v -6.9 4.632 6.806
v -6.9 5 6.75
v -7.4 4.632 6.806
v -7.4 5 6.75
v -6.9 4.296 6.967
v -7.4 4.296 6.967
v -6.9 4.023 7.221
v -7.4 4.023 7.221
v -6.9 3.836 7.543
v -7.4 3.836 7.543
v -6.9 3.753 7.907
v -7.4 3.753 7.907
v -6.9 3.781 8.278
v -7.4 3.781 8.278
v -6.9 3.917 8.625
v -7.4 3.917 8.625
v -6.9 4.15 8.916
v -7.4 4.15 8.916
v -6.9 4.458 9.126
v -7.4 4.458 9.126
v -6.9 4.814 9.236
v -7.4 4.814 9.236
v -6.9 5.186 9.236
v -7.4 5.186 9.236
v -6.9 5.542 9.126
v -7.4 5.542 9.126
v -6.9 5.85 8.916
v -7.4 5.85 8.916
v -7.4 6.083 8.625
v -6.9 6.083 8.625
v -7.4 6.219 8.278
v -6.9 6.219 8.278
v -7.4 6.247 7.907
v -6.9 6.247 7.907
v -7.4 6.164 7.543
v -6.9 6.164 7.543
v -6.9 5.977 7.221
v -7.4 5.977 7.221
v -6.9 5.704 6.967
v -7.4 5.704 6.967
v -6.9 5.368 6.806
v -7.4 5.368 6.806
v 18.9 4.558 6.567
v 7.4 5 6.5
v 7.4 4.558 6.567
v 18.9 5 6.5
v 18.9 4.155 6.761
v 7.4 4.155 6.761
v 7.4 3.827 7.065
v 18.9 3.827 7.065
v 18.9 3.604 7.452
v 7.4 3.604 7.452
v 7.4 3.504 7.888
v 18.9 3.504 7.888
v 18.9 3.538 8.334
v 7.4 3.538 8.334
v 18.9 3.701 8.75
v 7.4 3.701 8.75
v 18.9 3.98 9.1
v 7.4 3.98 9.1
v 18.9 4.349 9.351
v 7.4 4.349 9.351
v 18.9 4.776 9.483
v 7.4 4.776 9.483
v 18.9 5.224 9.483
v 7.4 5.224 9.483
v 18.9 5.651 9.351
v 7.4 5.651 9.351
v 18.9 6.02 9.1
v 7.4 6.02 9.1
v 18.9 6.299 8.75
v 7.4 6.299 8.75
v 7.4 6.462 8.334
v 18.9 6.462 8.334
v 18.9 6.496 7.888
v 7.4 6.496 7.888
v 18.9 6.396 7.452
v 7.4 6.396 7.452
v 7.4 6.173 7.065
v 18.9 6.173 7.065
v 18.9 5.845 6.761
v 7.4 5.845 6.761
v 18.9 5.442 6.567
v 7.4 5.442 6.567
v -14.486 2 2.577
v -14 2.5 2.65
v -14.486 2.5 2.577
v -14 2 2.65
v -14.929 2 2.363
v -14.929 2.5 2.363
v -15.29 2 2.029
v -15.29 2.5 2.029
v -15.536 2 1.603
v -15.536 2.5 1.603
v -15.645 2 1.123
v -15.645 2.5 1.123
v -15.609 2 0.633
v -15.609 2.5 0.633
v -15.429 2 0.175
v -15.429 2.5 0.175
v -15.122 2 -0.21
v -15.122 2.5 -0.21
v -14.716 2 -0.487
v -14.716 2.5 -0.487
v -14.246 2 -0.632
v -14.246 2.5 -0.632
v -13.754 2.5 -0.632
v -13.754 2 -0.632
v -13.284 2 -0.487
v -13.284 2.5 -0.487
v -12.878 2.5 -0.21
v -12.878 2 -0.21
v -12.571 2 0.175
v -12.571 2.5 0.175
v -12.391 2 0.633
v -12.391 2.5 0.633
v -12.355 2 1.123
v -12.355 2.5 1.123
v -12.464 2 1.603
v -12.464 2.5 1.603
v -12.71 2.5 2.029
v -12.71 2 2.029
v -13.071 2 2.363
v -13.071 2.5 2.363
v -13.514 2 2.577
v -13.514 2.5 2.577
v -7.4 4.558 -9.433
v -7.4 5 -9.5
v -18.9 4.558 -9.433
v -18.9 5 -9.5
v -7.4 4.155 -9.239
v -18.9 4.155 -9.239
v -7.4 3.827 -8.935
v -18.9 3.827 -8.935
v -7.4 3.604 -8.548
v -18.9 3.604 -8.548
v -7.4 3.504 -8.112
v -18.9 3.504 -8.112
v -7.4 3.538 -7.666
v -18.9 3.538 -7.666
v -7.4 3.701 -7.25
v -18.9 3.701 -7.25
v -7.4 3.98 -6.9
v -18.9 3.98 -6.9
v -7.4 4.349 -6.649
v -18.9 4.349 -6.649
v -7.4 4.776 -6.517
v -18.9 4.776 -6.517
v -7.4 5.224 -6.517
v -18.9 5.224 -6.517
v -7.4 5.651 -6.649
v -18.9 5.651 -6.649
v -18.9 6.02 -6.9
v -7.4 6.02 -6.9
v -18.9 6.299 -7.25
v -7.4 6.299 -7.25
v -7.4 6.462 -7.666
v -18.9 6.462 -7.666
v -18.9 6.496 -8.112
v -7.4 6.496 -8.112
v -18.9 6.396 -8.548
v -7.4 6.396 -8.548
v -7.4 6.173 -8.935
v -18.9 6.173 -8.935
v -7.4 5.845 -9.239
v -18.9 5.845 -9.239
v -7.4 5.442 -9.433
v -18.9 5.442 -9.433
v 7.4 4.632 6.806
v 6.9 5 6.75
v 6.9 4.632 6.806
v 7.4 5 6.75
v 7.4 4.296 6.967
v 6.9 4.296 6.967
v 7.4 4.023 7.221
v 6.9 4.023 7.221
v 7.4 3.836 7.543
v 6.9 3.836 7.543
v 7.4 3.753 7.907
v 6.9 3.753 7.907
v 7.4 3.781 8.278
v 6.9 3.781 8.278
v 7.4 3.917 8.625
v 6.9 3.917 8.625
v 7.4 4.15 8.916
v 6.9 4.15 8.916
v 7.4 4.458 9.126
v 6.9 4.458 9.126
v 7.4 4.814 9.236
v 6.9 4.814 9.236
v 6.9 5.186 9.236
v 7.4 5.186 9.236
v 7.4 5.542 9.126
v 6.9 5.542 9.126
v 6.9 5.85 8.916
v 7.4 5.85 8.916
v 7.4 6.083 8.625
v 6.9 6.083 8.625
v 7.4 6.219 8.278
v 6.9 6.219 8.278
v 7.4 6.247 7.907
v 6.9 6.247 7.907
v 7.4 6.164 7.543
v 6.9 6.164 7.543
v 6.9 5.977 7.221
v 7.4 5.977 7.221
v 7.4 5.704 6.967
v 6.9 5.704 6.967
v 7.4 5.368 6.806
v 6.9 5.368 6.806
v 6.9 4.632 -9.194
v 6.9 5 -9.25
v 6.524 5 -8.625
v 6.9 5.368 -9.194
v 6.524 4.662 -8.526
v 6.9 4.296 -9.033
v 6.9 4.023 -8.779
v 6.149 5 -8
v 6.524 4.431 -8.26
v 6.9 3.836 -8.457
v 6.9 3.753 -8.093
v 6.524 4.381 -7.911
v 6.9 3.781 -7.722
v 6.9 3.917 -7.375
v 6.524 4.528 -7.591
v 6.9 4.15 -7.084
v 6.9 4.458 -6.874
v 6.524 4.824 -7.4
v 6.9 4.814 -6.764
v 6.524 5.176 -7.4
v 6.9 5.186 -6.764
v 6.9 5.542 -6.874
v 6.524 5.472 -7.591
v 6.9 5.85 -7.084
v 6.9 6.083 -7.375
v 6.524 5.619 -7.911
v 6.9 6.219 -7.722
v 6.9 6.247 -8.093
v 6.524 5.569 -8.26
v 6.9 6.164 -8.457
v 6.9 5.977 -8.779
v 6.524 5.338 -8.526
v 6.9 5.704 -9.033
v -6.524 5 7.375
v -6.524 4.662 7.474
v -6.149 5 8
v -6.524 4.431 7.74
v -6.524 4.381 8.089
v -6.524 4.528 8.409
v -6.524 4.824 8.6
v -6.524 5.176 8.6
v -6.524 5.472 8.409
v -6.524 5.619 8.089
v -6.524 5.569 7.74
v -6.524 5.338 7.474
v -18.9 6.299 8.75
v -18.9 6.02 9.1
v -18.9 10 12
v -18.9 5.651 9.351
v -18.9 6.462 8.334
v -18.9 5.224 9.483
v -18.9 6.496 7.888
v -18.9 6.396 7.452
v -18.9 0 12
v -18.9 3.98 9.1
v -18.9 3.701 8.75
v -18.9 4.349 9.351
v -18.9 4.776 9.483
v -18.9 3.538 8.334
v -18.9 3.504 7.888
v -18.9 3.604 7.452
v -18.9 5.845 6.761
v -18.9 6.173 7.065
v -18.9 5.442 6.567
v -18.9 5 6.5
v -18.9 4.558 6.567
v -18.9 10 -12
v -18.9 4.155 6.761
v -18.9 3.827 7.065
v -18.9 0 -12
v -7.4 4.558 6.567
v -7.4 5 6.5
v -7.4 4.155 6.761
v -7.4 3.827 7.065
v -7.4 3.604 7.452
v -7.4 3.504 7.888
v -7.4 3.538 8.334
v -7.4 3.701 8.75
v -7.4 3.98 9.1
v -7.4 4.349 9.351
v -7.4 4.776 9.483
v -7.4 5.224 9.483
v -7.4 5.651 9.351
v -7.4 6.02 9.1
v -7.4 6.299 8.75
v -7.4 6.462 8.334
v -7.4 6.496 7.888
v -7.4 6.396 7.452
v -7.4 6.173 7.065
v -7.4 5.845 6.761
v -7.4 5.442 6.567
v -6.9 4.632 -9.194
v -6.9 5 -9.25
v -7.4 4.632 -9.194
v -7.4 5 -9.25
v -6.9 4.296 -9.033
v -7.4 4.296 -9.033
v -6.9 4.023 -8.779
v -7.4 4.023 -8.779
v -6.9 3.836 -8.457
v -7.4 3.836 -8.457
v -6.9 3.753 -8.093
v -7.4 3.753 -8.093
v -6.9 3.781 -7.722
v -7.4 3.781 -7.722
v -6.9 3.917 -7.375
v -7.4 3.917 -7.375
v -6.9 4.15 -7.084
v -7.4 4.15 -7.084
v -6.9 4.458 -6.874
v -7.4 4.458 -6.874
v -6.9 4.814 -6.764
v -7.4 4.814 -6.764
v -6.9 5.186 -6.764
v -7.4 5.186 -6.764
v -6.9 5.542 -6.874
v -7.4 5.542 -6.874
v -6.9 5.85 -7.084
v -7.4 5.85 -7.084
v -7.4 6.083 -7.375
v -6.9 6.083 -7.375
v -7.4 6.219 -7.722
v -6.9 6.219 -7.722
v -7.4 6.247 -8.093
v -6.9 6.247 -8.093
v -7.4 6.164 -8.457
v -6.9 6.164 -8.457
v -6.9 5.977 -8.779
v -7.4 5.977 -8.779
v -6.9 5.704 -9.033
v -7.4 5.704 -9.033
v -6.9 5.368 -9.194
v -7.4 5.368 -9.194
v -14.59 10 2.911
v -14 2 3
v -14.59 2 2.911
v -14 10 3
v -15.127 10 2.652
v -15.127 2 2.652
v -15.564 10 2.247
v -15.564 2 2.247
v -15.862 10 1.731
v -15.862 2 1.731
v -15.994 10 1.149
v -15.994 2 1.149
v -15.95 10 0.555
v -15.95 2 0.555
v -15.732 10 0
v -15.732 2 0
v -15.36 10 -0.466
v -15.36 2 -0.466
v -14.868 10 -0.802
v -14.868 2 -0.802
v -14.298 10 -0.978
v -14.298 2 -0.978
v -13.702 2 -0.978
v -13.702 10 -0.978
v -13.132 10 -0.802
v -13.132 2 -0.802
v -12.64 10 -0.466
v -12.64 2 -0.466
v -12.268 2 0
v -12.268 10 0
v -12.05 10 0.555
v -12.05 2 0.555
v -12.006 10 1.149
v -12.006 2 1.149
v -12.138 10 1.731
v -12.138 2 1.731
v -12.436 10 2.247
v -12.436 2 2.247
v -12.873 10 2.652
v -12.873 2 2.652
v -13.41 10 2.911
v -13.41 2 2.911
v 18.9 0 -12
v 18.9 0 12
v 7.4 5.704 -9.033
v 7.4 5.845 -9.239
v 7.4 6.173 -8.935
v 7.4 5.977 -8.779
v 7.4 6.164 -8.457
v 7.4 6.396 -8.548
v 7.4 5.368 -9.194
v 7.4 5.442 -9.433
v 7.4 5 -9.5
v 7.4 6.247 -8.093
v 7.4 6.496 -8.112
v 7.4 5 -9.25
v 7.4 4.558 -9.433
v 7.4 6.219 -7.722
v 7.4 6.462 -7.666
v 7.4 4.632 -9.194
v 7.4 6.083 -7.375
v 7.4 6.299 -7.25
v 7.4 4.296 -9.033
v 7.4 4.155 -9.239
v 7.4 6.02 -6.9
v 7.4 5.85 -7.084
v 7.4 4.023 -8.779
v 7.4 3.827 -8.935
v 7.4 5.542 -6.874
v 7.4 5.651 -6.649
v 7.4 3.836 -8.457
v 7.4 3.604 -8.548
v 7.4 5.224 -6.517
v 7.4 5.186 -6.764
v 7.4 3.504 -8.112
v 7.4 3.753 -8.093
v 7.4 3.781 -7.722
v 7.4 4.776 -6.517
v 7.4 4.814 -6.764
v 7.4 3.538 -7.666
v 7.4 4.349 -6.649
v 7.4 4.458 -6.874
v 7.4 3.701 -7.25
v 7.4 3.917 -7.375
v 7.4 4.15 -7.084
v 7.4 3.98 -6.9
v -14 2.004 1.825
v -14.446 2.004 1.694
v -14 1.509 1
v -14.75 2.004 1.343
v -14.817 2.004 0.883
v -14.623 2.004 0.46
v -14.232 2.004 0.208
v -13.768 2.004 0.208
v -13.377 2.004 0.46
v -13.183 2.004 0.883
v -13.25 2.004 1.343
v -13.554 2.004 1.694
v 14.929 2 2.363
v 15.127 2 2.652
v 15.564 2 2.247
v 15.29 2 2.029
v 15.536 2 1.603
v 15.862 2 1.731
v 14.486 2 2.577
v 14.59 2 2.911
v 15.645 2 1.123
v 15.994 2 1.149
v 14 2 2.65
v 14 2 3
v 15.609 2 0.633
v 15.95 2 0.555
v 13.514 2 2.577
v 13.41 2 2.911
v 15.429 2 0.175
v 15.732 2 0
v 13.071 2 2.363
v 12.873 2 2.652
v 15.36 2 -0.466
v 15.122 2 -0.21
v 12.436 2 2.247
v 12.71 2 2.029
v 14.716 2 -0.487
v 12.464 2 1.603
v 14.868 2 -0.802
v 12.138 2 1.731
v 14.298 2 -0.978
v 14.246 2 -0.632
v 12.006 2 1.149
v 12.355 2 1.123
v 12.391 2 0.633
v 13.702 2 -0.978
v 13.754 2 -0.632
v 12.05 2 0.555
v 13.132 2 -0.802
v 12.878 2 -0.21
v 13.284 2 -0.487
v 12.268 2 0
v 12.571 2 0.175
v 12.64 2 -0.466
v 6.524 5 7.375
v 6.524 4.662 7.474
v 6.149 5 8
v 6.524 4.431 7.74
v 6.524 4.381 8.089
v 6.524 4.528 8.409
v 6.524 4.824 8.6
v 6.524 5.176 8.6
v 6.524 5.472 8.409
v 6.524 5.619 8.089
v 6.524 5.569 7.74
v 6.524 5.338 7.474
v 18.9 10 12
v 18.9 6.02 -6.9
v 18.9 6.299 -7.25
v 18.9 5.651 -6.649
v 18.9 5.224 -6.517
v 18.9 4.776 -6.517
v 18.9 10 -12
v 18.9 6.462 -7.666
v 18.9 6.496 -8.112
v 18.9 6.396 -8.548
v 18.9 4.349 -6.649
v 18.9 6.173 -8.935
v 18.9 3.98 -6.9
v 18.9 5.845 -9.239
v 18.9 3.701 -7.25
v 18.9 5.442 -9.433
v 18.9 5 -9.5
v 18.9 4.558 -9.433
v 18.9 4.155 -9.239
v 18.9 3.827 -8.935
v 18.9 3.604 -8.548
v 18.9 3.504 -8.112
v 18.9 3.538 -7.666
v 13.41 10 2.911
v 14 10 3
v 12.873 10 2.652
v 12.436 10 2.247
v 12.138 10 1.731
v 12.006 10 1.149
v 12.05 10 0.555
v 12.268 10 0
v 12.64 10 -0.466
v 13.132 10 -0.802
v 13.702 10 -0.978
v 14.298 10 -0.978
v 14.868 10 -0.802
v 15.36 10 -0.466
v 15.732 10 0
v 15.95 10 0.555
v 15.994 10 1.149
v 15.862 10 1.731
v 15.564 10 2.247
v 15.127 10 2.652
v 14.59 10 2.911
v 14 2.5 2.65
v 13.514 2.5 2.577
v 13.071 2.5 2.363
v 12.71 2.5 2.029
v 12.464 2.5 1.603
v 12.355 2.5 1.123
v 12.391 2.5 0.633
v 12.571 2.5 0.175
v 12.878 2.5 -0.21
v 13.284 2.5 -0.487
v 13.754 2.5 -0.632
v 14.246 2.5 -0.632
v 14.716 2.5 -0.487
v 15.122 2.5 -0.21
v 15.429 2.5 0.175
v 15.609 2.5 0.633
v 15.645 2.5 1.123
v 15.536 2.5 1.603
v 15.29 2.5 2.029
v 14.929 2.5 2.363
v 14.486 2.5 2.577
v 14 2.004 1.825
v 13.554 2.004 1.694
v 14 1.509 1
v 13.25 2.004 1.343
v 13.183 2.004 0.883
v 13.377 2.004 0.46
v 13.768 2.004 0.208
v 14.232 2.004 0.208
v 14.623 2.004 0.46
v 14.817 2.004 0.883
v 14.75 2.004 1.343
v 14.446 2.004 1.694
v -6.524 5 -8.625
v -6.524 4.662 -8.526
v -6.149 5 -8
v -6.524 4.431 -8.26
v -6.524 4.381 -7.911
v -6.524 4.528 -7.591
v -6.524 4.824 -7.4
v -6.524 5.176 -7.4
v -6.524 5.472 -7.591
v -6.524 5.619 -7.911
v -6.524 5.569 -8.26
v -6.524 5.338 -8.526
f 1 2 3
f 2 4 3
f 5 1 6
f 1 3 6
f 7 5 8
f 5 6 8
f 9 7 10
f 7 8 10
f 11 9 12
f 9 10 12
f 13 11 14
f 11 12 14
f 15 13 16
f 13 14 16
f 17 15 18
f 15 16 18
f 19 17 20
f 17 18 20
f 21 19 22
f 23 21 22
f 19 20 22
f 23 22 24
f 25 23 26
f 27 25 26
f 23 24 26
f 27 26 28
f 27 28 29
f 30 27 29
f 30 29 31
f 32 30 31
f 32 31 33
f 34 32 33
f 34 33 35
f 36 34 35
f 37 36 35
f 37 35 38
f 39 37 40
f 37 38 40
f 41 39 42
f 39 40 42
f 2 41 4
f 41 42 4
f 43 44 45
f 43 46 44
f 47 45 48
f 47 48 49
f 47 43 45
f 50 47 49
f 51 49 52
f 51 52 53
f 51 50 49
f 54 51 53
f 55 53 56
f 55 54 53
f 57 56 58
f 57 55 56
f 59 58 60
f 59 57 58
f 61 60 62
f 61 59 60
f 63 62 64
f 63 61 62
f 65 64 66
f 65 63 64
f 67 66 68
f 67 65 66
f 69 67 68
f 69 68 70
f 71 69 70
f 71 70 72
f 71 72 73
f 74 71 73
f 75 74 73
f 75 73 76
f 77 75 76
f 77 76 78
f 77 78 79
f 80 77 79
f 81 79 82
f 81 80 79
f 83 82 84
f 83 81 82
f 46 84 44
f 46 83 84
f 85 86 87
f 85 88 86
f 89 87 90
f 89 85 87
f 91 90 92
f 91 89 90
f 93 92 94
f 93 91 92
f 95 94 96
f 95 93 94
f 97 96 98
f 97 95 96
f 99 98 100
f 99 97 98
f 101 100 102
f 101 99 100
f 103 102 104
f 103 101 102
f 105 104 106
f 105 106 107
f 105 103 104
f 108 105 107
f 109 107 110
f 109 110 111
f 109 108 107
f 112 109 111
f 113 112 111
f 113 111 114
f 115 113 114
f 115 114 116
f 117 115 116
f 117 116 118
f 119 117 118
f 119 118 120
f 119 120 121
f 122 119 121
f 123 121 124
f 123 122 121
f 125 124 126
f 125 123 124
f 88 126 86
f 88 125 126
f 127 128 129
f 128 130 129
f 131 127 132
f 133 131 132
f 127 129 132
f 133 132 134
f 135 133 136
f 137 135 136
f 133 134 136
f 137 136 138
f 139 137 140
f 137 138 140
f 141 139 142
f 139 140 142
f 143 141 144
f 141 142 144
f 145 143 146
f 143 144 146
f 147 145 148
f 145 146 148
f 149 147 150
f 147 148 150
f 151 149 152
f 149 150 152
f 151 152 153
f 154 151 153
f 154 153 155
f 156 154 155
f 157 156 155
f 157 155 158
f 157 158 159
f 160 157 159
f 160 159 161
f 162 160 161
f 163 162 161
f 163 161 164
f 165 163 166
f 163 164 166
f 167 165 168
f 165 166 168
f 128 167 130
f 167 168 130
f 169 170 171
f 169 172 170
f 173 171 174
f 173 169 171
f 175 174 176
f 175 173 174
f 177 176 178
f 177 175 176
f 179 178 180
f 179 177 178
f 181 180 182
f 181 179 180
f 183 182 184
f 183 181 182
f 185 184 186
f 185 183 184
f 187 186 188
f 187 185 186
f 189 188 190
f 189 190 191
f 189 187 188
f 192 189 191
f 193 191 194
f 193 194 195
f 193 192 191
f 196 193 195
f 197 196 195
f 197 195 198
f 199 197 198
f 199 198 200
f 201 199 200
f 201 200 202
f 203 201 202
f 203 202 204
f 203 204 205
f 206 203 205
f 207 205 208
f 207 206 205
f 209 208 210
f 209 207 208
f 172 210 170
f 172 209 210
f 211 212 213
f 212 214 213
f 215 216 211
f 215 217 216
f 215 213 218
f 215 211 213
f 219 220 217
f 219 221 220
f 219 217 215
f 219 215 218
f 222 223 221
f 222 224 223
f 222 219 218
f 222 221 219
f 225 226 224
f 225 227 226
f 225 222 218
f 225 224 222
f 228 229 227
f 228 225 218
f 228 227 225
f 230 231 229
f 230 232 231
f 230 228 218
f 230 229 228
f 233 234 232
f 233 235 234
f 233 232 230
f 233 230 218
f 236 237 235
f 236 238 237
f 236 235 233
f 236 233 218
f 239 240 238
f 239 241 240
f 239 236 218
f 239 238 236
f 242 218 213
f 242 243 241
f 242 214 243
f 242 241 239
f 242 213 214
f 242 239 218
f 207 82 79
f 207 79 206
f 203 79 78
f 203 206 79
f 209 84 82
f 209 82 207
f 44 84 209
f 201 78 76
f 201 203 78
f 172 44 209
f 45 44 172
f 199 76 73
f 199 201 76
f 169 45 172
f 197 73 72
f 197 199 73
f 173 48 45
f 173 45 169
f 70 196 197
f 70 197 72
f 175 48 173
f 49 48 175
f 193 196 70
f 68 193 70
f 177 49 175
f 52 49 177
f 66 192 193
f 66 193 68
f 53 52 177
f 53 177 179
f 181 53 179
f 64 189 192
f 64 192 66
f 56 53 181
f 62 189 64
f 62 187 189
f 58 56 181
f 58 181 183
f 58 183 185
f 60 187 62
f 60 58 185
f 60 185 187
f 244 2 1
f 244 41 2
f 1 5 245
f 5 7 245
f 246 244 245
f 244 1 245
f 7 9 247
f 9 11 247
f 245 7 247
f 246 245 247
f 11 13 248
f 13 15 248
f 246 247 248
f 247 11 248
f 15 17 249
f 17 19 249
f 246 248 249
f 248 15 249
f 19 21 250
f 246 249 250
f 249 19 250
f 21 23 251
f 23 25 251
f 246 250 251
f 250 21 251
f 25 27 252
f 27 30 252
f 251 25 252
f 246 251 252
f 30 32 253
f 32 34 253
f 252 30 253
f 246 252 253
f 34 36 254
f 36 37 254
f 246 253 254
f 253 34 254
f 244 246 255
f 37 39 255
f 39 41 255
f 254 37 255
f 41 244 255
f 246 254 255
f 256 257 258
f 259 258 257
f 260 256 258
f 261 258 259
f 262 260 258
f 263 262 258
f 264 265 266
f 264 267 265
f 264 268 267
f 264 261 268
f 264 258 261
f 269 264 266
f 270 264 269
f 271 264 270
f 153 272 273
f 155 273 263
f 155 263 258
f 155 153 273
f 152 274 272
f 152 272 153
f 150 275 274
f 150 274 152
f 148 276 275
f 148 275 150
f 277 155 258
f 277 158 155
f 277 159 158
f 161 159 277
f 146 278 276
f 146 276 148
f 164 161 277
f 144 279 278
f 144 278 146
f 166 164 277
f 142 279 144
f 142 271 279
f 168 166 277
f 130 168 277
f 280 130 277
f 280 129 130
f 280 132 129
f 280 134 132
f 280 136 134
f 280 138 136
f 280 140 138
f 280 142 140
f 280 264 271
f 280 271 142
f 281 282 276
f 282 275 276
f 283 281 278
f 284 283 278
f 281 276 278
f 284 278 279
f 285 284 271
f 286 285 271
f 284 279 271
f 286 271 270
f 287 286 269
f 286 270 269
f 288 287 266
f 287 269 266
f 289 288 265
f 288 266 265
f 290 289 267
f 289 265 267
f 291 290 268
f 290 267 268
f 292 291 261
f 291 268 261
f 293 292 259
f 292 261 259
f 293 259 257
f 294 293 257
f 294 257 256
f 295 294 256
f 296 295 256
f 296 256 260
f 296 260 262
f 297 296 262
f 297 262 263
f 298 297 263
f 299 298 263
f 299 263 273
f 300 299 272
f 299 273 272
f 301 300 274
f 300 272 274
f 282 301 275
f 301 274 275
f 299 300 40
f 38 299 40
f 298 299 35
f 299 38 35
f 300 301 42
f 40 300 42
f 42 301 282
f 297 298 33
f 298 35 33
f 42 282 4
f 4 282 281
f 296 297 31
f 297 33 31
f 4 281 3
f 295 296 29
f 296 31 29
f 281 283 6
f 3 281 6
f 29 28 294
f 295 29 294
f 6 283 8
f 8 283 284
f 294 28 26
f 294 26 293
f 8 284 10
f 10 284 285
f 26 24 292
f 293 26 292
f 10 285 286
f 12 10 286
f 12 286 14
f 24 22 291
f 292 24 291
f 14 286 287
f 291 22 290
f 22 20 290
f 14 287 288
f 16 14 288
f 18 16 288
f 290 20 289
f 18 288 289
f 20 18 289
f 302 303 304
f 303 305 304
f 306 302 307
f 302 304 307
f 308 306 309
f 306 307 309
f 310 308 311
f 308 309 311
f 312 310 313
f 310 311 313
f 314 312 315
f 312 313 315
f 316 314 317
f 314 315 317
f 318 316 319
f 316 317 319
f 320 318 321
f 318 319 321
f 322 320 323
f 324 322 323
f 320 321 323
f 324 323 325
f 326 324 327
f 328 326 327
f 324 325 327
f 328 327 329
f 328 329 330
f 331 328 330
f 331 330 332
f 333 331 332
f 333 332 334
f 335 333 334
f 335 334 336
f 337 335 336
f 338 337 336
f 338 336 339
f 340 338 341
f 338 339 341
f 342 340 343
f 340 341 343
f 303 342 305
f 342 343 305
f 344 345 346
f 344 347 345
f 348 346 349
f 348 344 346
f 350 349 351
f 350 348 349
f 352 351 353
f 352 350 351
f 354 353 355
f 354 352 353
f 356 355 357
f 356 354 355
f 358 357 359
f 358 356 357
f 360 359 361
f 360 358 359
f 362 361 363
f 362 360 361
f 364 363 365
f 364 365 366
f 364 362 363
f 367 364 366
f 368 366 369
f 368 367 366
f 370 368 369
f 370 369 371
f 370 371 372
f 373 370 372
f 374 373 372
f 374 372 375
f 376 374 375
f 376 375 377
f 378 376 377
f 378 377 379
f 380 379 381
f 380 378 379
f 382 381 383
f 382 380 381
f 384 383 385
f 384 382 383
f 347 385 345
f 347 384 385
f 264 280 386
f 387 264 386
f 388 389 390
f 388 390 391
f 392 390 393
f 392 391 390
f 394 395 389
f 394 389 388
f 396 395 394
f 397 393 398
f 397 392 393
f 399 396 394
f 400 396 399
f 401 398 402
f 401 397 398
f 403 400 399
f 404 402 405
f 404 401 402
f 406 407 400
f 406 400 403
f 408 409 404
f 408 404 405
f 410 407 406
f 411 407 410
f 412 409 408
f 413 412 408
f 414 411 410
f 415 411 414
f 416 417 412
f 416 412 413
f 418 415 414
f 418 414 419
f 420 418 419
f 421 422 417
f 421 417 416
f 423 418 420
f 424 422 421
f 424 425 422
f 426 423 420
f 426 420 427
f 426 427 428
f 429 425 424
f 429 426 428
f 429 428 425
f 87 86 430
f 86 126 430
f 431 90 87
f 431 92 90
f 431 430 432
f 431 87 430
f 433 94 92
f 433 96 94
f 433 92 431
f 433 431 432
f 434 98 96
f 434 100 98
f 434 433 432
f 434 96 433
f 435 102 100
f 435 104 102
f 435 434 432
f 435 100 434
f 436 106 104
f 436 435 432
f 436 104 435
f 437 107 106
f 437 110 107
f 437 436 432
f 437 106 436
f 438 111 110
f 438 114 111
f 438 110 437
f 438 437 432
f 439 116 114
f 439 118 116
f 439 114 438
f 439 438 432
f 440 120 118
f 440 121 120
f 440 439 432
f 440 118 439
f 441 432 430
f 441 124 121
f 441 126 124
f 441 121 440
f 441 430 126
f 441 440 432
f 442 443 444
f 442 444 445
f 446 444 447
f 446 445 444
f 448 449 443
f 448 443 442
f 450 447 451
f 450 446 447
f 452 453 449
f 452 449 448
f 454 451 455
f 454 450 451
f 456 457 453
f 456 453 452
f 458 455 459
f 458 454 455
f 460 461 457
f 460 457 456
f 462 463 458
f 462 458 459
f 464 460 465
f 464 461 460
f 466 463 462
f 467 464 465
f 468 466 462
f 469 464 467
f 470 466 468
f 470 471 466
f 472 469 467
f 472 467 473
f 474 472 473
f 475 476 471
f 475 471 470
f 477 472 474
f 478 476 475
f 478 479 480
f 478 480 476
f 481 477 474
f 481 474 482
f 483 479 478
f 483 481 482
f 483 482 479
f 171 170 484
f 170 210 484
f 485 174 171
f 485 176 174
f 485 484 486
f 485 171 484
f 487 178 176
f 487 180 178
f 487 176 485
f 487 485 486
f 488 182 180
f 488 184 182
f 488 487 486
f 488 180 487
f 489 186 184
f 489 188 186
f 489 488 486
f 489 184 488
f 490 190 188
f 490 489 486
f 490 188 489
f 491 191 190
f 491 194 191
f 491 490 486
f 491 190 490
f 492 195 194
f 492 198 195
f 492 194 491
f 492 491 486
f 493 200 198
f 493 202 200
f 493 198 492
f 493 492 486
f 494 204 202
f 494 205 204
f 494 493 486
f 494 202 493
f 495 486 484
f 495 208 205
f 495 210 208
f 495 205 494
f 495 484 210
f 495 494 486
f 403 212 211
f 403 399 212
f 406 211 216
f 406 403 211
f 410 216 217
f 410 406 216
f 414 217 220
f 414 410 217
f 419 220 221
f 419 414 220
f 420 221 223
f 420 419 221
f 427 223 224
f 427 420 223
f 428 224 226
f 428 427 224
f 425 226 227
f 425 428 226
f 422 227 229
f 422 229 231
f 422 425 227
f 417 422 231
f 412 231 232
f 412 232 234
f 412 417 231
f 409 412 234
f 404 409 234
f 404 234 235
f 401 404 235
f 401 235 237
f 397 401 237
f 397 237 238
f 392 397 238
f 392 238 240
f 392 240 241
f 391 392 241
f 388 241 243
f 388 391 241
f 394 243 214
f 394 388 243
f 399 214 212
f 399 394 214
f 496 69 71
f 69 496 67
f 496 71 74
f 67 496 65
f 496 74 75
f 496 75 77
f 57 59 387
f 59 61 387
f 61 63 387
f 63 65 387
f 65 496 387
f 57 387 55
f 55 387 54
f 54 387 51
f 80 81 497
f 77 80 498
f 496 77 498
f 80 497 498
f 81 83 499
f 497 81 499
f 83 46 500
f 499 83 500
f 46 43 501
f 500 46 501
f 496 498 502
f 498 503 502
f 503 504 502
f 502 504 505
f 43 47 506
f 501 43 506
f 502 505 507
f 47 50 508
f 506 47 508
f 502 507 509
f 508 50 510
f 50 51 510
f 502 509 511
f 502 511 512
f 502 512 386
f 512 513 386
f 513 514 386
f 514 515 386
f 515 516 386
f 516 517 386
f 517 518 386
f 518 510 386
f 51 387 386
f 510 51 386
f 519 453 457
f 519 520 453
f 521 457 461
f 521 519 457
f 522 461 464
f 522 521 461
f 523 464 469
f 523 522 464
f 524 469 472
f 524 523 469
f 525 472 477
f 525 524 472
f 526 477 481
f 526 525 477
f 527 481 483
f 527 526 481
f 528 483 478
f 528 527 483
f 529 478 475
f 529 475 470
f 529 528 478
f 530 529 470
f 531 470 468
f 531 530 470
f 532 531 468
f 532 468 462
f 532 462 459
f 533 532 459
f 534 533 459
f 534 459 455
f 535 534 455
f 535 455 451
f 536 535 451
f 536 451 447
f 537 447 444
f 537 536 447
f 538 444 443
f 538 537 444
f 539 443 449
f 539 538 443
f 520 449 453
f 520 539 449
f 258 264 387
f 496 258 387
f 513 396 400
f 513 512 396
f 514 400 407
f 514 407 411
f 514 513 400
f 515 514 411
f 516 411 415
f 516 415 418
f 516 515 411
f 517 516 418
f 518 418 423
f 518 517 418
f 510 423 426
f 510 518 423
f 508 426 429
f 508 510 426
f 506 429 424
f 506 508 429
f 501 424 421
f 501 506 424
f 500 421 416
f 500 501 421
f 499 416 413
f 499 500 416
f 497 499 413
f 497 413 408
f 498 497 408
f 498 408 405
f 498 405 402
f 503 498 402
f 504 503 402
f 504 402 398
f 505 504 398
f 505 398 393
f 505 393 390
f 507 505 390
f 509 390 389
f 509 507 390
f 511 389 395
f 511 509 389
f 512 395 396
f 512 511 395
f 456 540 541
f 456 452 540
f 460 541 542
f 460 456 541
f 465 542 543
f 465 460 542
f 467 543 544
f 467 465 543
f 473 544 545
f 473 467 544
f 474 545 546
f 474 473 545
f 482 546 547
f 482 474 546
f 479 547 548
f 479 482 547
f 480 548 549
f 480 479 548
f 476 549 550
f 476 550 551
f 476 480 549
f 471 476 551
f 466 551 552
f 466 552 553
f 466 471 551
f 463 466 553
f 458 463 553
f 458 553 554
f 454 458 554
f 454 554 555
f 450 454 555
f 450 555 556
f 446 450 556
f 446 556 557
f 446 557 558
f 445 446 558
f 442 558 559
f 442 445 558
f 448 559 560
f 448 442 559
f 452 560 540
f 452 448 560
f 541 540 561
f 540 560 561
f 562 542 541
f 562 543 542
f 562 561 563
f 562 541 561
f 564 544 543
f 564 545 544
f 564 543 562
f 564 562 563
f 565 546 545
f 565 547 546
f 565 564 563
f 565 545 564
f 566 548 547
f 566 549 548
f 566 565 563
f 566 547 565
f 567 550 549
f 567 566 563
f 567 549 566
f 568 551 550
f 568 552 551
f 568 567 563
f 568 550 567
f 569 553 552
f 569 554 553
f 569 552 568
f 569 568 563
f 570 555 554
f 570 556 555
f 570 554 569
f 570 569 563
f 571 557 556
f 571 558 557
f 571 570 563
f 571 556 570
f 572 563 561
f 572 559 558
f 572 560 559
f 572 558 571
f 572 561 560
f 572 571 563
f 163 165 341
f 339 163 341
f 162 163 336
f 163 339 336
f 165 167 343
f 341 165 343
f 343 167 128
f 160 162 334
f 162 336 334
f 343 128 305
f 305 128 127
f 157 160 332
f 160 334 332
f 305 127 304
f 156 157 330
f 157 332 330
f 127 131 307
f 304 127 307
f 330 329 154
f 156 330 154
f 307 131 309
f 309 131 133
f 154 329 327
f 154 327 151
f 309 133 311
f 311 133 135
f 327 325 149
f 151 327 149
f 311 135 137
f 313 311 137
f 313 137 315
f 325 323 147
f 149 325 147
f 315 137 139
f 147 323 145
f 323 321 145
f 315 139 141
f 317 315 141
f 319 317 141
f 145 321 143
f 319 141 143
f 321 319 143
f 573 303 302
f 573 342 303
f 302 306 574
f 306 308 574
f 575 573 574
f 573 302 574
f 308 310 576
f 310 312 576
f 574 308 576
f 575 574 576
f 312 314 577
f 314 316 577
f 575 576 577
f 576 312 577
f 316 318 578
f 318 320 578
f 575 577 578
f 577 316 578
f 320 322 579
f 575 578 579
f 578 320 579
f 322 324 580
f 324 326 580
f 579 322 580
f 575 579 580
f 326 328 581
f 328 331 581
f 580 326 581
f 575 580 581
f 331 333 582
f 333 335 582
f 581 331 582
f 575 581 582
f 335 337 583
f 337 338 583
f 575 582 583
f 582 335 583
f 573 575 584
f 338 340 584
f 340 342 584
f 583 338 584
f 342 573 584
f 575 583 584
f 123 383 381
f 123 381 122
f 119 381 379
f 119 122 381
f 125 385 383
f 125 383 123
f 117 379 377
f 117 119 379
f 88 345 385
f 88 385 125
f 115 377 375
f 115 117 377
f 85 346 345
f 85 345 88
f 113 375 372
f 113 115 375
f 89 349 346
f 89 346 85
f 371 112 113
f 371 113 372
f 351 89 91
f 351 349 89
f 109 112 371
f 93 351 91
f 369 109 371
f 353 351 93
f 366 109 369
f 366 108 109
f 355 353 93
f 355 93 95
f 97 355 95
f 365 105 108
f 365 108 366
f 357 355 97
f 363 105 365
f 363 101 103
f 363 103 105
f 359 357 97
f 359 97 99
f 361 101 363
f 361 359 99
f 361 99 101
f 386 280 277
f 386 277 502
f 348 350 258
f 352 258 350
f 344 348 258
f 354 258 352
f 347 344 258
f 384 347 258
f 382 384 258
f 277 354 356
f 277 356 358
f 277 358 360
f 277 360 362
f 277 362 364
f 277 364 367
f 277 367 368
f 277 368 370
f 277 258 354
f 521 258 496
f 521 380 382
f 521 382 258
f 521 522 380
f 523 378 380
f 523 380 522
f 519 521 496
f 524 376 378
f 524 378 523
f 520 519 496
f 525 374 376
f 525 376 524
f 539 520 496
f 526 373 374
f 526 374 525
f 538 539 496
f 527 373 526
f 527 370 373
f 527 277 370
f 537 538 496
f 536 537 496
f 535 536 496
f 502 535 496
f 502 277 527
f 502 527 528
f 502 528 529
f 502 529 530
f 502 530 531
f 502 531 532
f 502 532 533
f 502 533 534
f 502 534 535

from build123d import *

# Parameters (mm, degrees)
SKETCH_1_W                  = 37.8
SKETCH_1_H                  = 24
EXTRUDE_1_DEPTH             = 10
HOLE_WIZARD_M4_1_AT_2_COUNT = 2
HOLE_WIZARD_M4_1_AT_2_PITCH = 28
HOLE_WIZARD_M3_1_AT_2_COUNT = 2
HOLE_WIZARD_M3_1_AT_2_PITCH = 16


with BuildPart() as part:
    # 草图1 → 凸台-拉伸1 (new body)
    with BuildSketch(Plane(origin=(0, 0, 0), x_dir=(1, 0, 0), z_dir=(0, 1, 0))):
        Rectangle(SKETCH_1_W, SKETCH_1_H)
    extrude(amount=EXTRUDE_1_DEPTH)

    # 草图5 → M4 螺纹孔1 (revolve, cut)
    with BuildSketch(Plane(origin=(-14, 10, 1), x_dir=(0, 0, 1), z_dir=(1, 0, 0))):
        Polygon((0, 0), (0, 8.491420021), (1.65, 7.5), (1.65, 8), (2, 8), (2, 0), align=None)
    hole_wizard_m4_1 = revolve(axis=Axis((-14, 16.35, 1), (0, -1, 0)), mode=Mode.SUBTRACT)

    # M4 螺纹孔1 at 2: M4 螺纹孔1 ×2
    with Locations(*[(i * HOLE_WIZARD_M4_1_AT_2_PITCH, 0, 0) for i in range(1, HOLE_WIZARD_M4_1_AT_2_COUNT)]):
        add(hole_wizard_m4_1, mode=Mode.SUBTRACT)

    # 草图6 → M3 螺纹孔1 (revolve, cut)
    with BuildSketch(Plane(origin=(18.9, 5, 8), x_dir=(0, 0, -1), z_dir=(0, 1, 0))):
        Polygon((0, 0), (0, 12.751075774), (1.25, 12), (1.25, 11.5), (1.5, 11.5), (1.5, 0), align=None)
    hole_wizard_m3_1 = revolve(axis=Axis((25.25, 5, 8), (-1, 0, 0)), mode=Mode.SUBTRACT)

    # M3 螺纹孔1 at 2: M3 螺纹孔1 ×2
    with Locations(*[(0, 0, -i * HOLE_WIZARD_M3_1_AT_2_PITCH) for i in range(1, HOLE_WIZARD_M3_1_AT_2_COUNT)]):
        add(hole_wizard_m3_1, mode=Mode.SUBTRACT)

    # 镜向1: M3 螺纹孔1 across plane
    add(hole_wizard_m3_1.mirror(Plane(origin=(0, 0, 0), x_dir=(0, 0, 1), z_dir=(1, 0, 0))), mode=Mode.SUBTRACT)

    # 镜向1 copy 1 sketch → 镜向1 copy 1 (revolve, cut)
    with BuildSketch(Plane(origin=(-18.9, 5, -8), x_dir=(0, 0, -1), z_dir=(0, 1, 0))):
        Polygon((0, 0), (0, -12.751075774), (1.25, -12), (1.25, -11.5), (1.5, -11.5), (1.5, 0), align=None)
    revolve(axis=Axis((-25.25, 5, -8), (-1, 0, 0)), mode=Mode.SUBTRACT)


solid = part.part
